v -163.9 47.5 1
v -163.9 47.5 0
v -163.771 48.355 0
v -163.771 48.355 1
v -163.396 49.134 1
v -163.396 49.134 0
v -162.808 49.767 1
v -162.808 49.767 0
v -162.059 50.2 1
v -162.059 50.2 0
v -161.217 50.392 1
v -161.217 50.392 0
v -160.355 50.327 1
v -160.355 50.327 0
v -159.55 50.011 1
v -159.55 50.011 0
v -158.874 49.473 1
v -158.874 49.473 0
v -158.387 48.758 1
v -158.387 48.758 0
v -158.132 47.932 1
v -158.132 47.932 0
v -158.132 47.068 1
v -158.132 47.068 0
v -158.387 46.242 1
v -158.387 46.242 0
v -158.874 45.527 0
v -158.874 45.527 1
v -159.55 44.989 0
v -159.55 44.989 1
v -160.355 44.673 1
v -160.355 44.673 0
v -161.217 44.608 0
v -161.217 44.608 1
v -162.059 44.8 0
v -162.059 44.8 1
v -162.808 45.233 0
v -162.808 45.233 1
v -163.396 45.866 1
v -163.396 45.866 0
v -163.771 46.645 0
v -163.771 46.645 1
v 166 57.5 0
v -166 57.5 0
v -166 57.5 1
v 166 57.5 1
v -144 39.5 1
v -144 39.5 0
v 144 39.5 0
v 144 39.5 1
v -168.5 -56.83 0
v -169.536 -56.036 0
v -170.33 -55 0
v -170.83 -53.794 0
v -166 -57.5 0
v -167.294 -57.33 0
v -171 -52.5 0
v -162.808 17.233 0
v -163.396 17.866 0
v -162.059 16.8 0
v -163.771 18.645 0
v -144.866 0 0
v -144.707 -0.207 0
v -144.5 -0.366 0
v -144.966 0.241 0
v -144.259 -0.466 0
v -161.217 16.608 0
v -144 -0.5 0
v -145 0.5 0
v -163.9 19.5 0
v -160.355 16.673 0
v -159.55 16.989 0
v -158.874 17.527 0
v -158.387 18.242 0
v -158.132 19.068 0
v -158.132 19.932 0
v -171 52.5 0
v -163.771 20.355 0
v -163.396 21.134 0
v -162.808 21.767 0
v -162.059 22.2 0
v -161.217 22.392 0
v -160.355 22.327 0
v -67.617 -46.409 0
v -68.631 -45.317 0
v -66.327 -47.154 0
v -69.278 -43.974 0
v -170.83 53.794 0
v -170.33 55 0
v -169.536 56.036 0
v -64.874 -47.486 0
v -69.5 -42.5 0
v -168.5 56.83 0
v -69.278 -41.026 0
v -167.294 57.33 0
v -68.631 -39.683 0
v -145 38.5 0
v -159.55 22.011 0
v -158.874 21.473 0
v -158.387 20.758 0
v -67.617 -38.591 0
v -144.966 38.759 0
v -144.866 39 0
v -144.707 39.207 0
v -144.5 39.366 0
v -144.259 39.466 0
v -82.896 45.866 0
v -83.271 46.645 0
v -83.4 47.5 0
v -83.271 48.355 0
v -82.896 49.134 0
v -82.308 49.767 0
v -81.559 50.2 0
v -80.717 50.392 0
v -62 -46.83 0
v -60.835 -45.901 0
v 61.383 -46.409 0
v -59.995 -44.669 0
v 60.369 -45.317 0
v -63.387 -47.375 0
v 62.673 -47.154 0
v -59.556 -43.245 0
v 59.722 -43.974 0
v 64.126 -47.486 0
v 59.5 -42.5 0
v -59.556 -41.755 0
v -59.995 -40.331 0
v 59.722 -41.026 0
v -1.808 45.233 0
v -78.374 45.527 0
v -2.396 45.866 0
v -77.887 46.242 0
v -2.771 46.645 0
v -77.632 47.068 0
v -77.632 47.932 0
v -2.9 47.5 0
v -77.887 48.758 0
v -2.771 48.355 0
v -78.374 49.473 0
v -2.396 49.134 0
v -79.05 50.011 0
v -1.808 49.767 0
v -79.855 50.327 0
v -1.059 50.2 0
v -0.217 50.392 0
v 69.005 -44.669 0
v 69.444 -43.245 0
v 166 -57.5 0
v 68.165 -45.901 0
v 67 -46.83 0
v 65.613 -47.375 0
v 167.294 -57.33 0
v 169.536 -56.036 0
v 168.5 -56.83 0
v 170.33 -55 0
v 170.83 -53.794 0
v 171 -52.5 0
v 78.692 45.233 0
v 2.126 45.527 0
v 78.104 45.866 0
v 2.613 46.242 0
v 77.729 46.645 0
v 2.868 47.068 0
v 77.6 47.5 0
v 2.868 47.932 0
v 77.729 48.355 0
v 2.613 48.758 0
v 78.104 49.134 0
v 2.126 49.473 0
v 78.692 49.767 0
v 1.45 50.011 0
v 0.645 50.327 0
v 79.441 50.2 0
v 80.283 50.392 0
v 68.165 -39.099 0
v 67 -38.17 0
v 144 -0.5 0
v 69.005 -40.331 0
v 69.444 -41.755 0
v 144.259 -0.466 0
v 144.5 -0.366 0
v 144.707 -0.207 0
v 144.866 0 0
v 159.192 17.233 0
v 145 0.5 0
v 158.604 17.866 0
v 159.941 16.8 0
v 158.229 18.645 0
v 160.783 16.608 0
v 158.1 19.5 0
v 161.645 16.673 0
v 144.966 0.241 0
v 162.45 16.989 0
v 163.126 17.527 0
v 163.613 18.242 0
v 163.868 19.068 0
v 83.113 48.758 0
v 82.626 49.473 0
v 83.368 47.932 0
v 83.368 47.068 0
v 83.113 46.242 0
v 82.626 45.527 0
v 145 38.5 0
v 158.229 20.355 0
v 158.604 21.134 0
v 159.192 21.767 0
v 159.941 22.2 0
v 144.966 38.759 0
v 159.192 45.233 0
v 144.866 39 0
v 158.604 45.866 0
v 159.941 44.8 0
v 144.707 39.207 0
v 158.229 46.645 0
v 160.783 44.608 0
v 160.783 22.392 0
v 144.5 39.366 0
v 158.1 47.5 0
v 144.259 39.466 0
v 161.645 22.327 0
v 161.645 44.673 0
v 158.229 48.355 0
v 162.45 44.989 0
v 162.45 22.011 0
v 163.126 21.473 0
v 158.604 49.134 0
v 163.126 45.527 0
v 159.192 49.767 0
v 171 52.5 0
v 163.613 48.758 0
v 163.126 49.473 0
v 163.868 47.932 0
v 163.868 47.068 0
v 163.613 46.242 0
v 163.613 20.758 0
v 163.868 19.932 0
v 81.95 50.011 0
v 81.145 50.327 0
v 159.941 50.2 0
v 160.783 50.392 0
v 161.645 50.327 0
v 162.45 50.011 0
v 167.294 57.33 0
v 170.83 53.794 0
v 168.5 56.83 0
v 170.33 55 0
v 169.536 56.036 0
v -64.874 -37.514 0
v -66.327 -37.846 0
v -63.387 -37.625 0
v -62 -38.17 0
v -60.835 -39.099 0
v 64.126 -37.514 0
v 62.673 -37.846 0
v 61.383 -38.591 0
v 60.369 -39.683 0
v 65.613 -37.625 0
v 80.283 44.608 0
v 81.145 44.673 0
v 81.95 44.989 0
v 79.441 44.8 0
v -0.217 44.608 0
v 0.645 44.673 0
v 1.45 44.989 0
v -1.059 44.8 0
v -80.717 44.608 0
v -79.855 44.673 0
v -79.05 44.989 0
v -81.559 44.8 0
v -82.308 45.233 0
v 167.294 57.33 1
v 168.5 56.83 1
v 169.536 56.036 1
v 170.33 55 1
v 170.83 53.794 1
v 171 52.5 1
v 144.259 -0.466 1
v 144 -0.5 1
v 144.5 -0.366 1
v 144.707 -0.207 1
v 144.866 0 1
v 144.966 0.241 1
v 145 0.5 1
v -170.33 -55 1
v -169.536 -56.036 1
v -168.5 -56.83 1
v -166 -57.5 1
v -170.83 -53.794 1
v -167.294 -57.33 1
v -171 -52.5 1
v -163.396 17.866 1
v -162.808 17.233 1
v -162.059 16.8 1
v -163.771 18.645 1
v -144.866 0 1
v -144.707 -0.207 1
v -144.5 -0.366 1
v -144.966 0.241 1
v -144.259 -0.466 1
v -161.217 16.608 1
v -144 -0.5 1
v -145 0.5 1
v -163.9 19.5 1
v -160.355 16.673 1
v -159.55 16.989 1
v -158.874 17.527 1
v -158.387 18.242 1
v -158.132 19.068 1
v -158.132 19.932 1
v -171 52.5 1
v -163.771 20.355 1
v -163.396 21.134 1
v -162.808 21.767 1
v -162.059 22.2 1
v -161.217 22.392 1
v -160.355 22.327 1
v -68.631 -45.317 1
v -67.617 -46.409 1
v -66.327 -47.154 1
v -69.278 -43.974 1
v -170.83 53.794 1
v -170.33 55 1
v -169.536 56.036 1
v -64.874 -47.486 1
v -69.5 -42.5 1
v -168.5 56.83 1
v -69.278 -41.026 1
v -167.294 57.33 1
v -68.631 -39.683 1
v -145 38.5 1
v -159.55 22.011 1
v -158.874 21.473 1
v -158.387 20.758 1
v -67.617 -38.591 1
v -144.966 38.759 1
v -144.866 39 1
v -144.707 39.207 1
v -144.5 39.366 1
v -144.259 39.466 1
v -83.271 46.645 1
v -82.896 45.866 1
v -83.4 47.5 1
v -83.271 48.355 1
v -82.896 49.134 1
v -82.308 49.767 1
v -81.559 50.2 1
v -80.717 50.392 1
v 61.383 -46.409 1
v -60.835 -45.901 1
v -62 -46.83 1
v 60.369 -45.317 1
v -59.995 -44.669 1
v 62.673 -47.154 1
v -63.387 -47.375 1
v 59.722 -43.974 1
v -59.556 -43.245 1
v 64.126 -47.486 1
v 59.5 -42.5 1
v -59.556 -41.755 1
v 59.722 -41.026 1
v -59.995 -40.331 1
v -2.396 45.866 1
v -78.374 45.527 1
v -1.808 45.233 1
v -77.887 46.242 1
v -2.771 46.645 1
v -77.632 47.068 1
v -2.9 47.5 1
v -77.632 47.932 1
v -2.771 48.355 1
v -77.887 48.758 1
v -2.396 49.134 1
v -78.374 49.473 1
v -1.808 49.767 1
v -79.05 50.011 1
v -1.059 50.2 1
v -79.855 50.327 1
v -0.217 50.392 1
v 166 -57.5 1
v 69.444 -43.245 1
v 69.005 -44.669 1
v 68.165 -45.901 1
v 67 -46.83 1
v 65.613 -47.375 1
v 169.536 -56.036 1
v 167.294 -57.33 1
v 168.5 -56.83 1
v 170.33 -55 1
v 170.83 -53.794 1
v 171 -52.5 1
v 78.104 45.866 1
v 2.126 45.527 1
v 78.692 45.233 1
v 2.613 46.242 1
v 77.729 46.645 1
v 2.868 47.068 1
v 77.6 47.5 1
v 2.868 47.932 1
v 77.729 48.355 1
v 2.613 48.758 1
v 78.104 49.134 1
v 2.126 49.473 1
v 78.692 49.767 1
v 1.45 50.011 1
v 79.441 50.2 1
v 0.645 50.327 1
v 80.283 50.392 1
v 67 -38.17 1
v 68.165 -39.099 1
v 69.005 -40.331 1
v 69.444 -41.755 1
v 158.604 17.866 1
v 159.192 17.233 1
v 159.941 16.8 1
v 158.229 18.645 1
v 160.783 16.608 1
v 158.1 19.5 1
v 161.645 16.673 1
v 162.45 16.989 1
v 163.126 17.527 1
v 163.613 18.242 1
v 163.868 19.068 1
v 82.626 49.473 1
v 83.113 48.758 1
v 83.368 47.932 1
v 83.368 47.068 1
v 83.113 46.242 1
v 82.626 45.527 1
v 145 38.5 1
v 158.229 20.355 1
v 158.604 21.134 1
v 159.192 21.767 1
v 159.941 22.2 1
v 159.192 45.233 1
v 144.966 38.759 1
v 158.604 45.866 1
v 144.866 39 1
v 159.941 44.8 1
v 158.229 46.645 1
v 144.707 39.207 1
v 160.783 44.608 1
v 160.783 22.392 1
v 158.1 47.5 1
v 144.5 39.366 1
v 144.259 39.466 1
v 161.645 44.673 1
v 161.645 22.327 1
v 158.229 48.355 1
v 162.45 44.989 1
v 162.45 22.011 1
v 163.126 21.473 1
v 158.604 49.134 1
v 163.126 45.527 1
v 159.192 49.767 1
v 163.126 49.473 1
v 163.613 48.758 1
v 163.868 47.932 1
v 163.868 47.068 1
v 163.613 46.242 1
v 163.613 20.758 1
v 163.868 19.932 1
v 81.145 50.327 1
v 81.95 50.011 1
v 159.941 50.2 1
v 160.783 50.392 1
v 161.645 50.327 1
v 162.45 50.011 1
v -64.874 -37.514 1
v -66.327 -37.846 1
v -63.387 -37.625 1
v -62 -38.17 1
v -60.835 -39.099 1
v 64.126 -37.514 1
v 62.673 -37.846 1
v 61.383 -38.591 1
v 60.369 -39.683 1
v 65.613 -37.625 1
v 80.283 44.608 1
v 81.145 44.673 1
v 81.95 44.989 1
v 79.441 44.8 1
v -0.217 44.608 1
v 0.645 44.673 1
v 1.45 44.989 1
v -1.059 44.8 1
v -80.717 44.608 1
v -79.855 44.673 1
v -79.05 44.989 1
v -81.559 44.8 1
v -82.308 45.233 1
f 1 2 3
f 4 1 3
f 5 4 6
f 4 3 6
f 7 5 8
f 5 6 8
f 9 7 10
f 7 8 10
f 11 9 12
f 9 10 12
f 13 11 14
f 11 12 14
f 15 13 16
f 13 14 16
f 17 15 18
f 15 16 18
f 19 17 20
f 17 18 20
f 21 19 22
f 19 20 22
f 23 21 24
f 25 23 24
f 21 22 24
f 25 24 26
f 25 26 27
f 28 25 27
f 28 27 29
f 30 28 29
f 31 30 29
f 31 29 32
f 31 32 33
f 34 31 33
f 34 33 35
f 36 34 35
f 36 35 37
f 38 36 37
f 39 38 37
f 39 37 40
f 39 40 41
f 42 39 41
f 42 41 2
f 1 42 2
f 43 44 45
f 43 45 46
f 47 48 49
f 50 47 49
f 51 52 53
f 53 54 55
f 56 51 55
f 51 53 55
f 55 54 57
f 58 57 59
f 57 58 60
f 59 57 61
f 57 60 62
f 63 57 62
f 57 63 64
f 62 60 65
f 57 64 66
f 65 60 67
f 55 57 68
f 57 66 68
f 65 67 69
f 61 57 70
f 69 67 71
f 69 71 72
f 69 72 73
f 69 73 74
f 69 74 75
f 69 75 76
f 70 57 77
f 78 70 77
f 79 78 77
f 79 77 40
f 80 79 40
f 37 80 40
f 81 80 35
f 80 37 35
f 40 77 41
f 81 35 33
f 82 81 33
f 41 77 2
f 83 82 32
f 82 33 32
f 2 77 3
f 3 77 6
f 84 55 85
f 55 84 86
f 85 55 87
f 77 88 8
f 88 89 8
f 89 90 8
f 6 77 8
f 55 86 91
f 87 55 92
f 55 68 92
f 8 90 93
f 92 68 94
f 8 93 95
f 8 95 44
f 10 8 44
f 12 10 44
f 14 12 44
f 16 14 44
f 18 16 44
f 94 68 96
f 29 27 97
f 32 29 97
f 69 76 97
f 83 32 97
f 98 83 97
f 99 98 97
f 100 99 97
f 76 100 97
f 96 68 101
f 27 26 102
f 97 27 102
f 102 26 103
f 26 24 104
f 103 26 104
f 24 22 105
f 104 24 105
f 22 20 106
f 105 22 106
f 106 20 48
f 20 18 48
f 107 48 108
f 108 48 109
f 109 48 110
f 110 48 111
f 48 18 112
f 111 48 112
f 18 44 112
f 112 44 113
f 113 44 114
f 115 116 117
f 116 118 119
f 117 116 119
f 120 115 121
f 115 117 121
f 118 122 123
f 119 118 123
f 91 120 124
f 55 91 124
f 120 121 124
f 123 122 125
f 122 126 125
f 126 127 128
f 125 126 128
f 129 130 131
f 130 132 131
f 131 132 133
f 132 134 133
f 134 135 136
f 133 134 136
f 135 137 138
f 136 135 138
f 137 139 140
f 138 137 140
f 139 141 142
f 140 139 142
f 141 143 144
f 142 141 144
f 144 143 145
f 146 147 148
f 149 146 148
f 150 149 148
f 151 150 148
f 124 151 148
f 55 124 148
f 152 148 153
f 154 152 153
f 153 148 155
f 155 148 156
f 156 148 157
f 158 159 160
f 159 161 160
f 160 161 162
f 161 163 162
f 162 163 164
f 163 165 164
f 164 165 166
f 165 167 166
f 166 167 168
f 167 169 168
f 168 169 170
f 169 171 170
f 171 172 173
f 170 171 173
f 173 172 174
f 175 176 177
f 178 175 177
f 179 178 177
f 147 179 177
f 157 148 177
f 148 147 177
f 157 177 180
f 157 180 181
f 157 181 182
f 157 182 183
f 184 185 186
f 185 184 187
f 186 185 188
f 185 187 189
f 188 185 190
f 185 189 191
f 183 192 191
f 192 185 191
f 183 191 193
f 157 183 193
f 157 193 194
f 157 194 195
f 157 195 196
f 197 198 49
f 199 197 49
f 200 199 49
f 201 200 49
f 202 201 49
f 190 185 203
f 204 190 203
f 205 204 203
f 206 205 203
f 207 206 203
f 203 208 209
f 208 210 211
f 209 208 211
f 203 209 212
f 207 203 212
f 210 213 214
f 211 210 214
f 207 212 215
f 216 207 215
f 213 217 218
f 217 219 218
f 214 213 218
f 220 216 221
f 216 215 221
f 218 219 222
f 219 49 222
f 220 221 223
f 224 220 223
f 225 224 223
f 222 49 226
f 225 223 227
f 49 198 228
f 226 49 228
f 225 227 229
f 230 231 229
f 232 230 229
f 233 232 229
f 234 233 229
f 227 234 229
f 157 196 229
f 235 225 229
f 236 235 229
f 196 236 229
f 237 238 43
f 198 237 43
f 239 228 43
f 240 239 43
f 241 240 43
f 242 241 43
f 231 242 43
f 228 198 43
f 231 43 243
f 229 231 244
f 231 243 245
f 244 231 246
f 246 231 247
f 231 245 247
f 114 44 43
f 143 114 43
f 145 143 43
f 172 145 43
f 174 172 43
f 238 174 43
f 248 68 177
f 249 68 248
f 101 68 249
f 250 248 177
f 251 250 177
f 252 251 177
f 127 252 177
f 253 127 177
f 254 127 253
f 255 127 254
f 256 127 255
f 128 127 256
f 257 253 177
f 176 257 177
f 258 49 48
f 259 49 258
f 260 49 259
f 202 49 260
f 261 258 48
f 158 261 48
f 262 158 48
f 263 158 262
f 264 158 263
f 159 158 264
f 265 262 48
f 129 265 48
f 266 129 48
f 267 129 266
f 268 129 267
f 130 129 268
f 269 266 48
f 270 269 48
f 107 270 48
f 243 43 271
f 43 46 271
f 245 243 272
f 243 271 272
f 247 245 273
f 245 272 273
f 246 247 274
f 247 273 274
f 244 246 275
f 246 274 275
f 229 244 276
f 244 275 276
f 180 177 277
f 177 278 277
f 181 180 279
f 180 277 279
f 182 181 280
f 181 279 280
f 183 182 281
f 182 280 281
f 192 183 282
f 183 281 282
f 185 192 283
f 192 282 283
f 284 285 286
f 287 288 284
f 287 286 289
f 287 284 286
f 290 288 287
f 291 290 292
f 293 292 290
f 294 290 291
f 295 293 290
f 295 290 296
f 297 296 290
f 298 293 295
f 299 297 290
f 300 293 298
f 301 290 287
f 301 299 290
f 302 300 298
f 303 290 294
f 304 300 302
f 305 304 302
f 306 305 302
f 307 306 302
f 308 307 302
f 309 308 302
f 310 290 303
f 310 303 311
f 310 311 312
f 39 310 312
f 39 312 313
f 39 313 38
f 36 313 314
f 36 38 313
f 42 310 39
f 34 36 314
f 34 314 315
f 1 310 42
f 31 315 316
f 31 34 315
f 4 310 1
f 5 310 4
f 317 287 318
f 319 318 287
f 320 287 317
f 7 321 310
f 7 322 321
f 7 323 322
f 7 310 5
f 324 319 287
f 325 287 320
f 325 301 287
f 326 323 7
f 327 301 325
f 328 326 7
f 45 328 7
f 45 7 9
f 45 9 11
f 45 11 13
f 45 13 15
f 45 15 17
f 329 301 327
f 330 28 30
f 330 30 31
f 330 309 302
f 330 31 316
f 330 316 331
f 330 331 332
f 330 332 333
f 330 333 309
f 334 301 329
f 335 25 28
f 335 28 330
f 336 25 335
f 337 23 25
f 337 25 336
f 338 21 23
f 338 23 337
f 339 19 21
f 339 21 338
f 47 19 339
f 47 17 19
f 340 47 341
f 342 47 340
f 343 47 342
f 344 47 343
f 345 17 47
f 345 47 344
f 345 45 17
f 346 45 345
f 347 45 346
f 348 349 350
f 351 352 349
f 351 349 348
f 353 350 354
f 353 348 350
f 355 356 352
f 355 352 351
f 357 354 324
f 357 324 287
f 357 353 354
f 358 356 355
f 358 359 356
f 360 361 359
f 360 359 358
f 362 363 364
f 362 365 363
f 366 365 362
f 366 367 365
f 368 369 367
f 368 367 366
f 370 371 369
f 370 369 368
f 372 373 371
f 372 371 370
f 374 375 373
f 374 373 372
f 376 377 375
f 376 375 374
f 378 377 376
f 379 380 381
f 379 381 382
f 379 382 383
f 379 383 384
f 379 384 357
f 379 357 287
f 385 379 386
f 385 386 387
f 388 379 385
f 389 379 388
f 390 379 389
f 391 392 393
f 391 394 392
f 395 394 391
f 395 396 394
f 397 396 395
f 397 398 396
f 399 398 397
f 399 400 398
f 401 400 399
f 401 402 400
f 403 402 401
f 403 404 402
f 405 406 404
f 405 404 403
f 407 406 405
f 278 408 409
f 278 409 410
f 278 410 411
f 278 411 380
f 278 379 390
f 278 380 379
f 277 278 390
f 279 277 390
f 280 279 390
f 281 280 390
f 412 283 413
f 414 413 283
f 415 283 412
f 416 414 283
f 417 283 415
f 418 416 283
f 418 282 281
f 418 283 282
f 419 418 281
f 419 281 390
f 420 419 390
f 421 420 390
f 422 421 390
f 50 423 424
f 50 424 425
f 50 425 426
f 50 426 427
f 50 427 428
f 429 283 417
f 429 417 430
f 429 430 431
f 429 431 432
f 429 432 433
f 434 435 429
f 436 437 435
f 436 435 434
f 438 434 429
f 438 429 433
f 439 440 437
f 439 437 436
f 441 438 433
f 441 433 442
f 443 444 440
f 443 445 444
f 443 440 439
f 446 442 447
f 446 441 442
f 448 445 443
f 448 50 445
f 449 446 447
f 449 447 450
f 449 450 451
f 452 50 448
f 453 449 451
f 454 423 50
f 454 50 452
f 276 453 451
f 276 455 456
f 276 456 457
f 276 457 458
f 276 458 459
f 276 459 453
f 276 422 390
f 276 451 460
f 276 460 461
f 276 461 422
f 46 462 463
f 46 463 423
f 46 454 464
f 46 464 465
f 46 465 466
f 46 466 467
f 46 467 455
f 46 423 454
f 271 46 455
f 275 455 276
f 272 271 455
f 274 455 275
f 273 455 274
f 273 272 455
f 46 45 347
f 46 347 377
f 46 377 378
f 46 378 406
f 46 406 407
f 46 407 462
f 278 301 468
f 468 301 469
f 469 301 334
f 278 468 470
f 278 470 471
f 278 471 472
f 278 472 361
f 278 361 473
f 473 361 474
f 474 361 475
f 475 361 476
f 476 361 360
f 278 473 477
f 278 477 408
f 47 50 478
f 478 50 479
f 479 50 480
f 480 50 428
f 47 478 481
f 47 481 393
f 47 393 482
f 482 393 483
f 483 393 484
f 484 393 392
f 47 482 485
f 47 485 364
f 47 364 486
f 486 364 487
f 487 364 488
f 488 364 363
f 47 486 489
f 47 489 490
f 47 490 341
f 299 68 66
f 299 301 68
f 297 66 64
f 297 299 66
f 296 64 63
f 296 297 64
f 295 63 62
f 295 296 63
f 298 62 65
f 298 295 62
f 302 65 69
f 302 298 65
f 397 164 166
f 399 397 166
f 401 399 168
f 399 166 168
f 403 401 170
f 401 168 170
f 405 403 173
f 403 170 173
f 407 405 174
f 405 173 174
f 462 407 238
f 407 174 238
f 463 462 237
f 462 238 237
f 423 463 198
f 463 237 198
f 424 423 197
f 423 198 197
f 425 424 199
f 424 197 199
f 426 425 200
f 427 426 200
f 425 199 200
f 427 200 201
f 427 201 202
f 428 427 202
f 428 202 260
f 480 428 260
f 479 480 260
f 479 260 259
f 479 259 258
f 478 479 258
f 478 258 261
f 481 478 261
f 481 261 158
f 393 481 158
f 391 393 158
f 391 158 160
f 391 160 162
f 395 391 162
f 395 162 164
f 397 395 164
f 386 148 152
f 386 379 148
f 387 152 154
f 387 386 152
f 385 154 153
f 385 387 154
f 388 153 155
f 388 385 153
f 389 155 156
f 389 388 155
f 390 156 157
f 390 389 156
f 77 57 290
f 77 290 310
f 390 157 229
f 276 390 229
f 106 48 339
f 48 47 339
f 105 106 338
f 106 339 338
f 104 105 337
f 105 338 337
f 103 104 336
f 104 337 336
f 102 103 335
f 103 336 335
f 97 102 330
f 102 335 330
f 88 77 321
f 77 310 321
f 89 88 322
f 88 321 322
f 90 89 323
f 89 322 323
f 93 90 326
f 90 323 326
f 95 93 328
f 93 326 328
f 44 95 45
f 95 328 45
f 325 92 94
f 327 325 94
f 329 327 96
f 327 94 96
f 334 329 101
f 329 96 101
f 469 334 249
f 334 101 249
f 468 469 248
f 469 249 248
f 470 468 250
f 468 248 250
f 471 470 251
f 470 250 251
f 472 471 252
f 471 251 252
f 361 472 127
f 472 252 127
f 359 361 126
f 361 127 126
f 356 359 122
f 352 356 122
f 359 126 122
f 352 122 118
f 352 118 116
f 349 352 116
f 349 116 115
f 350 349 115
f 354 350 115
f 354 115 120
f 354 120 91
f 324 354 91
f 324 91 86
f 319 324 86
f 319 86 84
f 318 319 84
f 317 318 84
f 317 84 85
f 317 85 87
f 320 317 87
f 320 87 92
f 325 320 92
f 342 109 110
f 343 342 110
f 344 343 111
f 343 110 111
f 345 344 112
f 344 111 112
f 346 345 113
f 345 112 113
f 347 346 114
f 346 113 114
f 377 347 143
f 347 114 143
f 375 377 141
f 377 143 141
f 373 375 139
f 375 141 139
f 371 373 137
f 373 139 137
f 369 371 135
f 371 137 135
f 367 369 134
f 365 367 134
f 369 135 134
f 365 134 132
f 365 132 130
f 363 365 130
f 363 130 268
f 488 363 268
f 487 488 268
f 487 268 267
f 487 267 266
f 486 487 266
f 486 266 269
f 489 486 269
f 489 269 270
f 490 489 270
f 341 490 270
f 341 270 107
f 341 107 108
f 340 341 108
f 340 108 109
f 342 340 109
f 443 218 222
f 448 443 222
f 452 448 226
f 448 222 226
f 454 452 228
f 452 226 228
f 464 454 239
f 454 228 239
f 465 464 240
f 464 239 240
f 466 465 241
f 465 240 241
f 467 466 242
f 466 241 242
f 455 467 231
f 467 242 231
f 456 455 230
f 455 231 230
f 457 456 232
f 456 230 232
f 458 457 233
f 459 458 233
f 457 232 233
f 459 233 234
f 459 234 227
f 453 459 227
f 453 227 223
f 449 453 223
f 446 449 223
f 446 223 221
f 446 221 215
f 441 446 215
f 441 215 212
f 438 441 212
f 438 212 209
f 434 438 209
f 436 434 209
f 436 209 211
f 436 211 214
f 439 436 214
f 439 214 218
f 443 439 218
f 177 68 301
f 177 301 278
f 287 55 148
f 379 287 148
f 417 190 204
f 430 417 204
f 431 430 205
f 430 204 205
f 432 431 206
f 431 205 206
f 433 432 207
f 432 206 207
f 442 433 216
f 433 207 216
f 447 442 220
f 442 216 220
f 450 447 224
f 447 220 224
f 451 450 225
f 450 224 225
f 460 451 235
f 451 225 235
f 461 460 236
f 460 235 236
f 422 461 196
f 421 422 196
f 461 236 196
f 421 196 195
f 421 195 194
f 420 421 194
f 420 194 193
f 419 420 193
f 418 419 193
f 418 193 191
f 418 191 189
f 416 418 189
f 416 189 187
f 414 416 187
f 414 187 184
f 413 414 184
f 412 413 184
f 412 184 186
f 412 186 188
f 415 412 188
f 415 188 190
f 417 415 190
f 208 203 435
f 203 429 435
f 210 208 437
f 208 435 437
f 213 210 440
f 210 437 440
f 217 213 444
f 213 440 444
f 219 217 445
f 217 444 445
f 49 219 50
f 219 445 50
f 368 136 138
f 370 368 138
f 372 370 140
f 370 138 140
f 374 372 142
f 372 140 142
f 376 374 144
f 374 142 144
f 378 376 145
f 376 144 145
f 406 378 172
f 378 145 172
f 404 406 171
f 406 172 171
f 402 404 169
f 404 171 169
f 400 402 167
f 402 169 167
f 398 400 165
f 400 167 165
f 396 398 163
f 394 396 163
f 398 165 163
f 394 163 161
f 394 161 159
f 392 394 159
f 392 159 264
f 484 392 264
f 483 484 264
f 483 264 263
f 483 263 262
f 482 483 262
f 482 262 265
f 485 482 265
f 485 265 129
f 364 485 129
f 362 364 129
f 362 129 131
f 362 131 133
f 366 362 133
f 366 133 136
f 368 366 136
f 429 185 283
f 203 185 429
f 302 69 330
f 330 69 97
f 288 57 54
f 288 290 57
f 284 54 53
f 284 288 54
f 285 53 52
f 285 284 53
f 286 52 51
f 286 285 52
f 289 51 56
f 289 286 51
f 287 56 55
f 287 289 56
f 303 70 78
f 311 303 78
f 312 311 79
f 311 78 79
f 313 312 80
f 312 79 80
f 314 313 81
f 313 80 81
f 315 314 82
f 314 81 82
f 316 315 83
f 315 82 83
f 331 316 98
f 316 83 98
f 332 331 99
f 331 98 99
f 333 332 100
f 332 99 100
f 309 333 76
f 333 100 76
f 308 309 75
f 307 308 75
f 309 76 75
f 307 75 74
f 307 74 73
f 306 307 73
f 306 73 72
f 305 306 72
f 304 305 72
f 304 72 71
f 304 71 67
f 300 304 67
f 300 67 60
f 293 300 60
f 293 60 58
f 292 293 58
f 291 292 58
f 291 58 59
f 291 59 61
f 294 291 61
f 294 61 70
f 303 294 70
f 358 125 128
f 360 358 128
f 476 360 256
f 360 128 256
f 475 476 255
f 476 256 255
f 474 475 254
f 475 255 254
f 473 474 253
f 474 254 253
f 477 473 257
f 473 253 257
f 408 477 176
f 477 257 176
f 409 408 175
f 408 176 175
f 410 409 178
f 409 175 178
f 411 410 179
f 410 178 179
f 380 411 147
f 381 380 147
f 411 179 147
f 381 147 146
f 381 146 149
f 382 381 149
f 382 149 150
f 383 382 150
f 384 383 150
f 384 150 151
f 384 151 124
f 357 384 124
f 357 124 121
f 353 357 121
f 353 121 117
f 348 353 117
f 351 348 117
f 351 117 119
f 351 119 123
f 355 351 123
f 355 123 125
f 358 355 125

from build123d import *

# Parameters (mm, degrees)
SKETCH1_W            = 342
SKETCH1_H            = 115
SKETCH1_W_2          = 290
SKETCH1_H_2          = 40
BOSS_EXTRUDE1_DEPTH  = 1
FILLET1_R            = 5
FILLET2_R            = 1
M5_CLEARANCE_HOLE1_D = 5.8
M8_CLEARANCE_HOLE1_D = 10


with BuildPart() as part:
    # Sketch1 → Boss-Extrude1 (new body)
    with BuildSketch(Plane.XY):
        Rectangle(SKETCH1_W, SKETCH1_H)
        with Locations((0, 19.5)):
            Rectangle(SKETCH1_W_2, SKETCH1_H_2, mode=Mode.SUBTRACT)
    extrude(amount=BOSS_EXTRUDE1_DEPTH)

    # Fillet1
    fillet1_edges = [part.edges().sort_by_distance(p)[0] for p in [
        (-171, 57.5, 0.5),
        (171, 57.5, 0.5),
        (171, -57.5, 0.5),
        (-171, -57.5, 0.5),
    ]]
    fillet(fillet1_edges, radius=FILLET1_R)

    # Fillet2
    fillet2_edges = [part.edges().sort_by_distance(p)[0] for p in [
        (-145, -0.5, 0.5),
        (145, -0.5, 0.5),
        (145, 39.5, 0.5),
        (-145, 39.5, 0.5),
    ]]
    fillet(fillet2_edges, radius=FILLET2_R)

    # M5 Clearance Hole1 (through all)
    with Locations(Plane.XY.offset(1)):
        with Locations((-161, 47.5), (-161, 19.5), (-80.5, 47.5), (0, 47.5), (80.5, 47.5), (161, 47.5), (161, 19.5)):
            Hole(M5_CLEARANCE_HOLE1_D / 2)

    # M8 Clearance Hole1 (through all)
    with Locations(Plane.XY.offset(1)):
        with Locations((-64.5, -42.5), (64.5, -42.5)):
            Hole(M8_CLEARANCE_HOLE1_D / 2)


solid = part.part
